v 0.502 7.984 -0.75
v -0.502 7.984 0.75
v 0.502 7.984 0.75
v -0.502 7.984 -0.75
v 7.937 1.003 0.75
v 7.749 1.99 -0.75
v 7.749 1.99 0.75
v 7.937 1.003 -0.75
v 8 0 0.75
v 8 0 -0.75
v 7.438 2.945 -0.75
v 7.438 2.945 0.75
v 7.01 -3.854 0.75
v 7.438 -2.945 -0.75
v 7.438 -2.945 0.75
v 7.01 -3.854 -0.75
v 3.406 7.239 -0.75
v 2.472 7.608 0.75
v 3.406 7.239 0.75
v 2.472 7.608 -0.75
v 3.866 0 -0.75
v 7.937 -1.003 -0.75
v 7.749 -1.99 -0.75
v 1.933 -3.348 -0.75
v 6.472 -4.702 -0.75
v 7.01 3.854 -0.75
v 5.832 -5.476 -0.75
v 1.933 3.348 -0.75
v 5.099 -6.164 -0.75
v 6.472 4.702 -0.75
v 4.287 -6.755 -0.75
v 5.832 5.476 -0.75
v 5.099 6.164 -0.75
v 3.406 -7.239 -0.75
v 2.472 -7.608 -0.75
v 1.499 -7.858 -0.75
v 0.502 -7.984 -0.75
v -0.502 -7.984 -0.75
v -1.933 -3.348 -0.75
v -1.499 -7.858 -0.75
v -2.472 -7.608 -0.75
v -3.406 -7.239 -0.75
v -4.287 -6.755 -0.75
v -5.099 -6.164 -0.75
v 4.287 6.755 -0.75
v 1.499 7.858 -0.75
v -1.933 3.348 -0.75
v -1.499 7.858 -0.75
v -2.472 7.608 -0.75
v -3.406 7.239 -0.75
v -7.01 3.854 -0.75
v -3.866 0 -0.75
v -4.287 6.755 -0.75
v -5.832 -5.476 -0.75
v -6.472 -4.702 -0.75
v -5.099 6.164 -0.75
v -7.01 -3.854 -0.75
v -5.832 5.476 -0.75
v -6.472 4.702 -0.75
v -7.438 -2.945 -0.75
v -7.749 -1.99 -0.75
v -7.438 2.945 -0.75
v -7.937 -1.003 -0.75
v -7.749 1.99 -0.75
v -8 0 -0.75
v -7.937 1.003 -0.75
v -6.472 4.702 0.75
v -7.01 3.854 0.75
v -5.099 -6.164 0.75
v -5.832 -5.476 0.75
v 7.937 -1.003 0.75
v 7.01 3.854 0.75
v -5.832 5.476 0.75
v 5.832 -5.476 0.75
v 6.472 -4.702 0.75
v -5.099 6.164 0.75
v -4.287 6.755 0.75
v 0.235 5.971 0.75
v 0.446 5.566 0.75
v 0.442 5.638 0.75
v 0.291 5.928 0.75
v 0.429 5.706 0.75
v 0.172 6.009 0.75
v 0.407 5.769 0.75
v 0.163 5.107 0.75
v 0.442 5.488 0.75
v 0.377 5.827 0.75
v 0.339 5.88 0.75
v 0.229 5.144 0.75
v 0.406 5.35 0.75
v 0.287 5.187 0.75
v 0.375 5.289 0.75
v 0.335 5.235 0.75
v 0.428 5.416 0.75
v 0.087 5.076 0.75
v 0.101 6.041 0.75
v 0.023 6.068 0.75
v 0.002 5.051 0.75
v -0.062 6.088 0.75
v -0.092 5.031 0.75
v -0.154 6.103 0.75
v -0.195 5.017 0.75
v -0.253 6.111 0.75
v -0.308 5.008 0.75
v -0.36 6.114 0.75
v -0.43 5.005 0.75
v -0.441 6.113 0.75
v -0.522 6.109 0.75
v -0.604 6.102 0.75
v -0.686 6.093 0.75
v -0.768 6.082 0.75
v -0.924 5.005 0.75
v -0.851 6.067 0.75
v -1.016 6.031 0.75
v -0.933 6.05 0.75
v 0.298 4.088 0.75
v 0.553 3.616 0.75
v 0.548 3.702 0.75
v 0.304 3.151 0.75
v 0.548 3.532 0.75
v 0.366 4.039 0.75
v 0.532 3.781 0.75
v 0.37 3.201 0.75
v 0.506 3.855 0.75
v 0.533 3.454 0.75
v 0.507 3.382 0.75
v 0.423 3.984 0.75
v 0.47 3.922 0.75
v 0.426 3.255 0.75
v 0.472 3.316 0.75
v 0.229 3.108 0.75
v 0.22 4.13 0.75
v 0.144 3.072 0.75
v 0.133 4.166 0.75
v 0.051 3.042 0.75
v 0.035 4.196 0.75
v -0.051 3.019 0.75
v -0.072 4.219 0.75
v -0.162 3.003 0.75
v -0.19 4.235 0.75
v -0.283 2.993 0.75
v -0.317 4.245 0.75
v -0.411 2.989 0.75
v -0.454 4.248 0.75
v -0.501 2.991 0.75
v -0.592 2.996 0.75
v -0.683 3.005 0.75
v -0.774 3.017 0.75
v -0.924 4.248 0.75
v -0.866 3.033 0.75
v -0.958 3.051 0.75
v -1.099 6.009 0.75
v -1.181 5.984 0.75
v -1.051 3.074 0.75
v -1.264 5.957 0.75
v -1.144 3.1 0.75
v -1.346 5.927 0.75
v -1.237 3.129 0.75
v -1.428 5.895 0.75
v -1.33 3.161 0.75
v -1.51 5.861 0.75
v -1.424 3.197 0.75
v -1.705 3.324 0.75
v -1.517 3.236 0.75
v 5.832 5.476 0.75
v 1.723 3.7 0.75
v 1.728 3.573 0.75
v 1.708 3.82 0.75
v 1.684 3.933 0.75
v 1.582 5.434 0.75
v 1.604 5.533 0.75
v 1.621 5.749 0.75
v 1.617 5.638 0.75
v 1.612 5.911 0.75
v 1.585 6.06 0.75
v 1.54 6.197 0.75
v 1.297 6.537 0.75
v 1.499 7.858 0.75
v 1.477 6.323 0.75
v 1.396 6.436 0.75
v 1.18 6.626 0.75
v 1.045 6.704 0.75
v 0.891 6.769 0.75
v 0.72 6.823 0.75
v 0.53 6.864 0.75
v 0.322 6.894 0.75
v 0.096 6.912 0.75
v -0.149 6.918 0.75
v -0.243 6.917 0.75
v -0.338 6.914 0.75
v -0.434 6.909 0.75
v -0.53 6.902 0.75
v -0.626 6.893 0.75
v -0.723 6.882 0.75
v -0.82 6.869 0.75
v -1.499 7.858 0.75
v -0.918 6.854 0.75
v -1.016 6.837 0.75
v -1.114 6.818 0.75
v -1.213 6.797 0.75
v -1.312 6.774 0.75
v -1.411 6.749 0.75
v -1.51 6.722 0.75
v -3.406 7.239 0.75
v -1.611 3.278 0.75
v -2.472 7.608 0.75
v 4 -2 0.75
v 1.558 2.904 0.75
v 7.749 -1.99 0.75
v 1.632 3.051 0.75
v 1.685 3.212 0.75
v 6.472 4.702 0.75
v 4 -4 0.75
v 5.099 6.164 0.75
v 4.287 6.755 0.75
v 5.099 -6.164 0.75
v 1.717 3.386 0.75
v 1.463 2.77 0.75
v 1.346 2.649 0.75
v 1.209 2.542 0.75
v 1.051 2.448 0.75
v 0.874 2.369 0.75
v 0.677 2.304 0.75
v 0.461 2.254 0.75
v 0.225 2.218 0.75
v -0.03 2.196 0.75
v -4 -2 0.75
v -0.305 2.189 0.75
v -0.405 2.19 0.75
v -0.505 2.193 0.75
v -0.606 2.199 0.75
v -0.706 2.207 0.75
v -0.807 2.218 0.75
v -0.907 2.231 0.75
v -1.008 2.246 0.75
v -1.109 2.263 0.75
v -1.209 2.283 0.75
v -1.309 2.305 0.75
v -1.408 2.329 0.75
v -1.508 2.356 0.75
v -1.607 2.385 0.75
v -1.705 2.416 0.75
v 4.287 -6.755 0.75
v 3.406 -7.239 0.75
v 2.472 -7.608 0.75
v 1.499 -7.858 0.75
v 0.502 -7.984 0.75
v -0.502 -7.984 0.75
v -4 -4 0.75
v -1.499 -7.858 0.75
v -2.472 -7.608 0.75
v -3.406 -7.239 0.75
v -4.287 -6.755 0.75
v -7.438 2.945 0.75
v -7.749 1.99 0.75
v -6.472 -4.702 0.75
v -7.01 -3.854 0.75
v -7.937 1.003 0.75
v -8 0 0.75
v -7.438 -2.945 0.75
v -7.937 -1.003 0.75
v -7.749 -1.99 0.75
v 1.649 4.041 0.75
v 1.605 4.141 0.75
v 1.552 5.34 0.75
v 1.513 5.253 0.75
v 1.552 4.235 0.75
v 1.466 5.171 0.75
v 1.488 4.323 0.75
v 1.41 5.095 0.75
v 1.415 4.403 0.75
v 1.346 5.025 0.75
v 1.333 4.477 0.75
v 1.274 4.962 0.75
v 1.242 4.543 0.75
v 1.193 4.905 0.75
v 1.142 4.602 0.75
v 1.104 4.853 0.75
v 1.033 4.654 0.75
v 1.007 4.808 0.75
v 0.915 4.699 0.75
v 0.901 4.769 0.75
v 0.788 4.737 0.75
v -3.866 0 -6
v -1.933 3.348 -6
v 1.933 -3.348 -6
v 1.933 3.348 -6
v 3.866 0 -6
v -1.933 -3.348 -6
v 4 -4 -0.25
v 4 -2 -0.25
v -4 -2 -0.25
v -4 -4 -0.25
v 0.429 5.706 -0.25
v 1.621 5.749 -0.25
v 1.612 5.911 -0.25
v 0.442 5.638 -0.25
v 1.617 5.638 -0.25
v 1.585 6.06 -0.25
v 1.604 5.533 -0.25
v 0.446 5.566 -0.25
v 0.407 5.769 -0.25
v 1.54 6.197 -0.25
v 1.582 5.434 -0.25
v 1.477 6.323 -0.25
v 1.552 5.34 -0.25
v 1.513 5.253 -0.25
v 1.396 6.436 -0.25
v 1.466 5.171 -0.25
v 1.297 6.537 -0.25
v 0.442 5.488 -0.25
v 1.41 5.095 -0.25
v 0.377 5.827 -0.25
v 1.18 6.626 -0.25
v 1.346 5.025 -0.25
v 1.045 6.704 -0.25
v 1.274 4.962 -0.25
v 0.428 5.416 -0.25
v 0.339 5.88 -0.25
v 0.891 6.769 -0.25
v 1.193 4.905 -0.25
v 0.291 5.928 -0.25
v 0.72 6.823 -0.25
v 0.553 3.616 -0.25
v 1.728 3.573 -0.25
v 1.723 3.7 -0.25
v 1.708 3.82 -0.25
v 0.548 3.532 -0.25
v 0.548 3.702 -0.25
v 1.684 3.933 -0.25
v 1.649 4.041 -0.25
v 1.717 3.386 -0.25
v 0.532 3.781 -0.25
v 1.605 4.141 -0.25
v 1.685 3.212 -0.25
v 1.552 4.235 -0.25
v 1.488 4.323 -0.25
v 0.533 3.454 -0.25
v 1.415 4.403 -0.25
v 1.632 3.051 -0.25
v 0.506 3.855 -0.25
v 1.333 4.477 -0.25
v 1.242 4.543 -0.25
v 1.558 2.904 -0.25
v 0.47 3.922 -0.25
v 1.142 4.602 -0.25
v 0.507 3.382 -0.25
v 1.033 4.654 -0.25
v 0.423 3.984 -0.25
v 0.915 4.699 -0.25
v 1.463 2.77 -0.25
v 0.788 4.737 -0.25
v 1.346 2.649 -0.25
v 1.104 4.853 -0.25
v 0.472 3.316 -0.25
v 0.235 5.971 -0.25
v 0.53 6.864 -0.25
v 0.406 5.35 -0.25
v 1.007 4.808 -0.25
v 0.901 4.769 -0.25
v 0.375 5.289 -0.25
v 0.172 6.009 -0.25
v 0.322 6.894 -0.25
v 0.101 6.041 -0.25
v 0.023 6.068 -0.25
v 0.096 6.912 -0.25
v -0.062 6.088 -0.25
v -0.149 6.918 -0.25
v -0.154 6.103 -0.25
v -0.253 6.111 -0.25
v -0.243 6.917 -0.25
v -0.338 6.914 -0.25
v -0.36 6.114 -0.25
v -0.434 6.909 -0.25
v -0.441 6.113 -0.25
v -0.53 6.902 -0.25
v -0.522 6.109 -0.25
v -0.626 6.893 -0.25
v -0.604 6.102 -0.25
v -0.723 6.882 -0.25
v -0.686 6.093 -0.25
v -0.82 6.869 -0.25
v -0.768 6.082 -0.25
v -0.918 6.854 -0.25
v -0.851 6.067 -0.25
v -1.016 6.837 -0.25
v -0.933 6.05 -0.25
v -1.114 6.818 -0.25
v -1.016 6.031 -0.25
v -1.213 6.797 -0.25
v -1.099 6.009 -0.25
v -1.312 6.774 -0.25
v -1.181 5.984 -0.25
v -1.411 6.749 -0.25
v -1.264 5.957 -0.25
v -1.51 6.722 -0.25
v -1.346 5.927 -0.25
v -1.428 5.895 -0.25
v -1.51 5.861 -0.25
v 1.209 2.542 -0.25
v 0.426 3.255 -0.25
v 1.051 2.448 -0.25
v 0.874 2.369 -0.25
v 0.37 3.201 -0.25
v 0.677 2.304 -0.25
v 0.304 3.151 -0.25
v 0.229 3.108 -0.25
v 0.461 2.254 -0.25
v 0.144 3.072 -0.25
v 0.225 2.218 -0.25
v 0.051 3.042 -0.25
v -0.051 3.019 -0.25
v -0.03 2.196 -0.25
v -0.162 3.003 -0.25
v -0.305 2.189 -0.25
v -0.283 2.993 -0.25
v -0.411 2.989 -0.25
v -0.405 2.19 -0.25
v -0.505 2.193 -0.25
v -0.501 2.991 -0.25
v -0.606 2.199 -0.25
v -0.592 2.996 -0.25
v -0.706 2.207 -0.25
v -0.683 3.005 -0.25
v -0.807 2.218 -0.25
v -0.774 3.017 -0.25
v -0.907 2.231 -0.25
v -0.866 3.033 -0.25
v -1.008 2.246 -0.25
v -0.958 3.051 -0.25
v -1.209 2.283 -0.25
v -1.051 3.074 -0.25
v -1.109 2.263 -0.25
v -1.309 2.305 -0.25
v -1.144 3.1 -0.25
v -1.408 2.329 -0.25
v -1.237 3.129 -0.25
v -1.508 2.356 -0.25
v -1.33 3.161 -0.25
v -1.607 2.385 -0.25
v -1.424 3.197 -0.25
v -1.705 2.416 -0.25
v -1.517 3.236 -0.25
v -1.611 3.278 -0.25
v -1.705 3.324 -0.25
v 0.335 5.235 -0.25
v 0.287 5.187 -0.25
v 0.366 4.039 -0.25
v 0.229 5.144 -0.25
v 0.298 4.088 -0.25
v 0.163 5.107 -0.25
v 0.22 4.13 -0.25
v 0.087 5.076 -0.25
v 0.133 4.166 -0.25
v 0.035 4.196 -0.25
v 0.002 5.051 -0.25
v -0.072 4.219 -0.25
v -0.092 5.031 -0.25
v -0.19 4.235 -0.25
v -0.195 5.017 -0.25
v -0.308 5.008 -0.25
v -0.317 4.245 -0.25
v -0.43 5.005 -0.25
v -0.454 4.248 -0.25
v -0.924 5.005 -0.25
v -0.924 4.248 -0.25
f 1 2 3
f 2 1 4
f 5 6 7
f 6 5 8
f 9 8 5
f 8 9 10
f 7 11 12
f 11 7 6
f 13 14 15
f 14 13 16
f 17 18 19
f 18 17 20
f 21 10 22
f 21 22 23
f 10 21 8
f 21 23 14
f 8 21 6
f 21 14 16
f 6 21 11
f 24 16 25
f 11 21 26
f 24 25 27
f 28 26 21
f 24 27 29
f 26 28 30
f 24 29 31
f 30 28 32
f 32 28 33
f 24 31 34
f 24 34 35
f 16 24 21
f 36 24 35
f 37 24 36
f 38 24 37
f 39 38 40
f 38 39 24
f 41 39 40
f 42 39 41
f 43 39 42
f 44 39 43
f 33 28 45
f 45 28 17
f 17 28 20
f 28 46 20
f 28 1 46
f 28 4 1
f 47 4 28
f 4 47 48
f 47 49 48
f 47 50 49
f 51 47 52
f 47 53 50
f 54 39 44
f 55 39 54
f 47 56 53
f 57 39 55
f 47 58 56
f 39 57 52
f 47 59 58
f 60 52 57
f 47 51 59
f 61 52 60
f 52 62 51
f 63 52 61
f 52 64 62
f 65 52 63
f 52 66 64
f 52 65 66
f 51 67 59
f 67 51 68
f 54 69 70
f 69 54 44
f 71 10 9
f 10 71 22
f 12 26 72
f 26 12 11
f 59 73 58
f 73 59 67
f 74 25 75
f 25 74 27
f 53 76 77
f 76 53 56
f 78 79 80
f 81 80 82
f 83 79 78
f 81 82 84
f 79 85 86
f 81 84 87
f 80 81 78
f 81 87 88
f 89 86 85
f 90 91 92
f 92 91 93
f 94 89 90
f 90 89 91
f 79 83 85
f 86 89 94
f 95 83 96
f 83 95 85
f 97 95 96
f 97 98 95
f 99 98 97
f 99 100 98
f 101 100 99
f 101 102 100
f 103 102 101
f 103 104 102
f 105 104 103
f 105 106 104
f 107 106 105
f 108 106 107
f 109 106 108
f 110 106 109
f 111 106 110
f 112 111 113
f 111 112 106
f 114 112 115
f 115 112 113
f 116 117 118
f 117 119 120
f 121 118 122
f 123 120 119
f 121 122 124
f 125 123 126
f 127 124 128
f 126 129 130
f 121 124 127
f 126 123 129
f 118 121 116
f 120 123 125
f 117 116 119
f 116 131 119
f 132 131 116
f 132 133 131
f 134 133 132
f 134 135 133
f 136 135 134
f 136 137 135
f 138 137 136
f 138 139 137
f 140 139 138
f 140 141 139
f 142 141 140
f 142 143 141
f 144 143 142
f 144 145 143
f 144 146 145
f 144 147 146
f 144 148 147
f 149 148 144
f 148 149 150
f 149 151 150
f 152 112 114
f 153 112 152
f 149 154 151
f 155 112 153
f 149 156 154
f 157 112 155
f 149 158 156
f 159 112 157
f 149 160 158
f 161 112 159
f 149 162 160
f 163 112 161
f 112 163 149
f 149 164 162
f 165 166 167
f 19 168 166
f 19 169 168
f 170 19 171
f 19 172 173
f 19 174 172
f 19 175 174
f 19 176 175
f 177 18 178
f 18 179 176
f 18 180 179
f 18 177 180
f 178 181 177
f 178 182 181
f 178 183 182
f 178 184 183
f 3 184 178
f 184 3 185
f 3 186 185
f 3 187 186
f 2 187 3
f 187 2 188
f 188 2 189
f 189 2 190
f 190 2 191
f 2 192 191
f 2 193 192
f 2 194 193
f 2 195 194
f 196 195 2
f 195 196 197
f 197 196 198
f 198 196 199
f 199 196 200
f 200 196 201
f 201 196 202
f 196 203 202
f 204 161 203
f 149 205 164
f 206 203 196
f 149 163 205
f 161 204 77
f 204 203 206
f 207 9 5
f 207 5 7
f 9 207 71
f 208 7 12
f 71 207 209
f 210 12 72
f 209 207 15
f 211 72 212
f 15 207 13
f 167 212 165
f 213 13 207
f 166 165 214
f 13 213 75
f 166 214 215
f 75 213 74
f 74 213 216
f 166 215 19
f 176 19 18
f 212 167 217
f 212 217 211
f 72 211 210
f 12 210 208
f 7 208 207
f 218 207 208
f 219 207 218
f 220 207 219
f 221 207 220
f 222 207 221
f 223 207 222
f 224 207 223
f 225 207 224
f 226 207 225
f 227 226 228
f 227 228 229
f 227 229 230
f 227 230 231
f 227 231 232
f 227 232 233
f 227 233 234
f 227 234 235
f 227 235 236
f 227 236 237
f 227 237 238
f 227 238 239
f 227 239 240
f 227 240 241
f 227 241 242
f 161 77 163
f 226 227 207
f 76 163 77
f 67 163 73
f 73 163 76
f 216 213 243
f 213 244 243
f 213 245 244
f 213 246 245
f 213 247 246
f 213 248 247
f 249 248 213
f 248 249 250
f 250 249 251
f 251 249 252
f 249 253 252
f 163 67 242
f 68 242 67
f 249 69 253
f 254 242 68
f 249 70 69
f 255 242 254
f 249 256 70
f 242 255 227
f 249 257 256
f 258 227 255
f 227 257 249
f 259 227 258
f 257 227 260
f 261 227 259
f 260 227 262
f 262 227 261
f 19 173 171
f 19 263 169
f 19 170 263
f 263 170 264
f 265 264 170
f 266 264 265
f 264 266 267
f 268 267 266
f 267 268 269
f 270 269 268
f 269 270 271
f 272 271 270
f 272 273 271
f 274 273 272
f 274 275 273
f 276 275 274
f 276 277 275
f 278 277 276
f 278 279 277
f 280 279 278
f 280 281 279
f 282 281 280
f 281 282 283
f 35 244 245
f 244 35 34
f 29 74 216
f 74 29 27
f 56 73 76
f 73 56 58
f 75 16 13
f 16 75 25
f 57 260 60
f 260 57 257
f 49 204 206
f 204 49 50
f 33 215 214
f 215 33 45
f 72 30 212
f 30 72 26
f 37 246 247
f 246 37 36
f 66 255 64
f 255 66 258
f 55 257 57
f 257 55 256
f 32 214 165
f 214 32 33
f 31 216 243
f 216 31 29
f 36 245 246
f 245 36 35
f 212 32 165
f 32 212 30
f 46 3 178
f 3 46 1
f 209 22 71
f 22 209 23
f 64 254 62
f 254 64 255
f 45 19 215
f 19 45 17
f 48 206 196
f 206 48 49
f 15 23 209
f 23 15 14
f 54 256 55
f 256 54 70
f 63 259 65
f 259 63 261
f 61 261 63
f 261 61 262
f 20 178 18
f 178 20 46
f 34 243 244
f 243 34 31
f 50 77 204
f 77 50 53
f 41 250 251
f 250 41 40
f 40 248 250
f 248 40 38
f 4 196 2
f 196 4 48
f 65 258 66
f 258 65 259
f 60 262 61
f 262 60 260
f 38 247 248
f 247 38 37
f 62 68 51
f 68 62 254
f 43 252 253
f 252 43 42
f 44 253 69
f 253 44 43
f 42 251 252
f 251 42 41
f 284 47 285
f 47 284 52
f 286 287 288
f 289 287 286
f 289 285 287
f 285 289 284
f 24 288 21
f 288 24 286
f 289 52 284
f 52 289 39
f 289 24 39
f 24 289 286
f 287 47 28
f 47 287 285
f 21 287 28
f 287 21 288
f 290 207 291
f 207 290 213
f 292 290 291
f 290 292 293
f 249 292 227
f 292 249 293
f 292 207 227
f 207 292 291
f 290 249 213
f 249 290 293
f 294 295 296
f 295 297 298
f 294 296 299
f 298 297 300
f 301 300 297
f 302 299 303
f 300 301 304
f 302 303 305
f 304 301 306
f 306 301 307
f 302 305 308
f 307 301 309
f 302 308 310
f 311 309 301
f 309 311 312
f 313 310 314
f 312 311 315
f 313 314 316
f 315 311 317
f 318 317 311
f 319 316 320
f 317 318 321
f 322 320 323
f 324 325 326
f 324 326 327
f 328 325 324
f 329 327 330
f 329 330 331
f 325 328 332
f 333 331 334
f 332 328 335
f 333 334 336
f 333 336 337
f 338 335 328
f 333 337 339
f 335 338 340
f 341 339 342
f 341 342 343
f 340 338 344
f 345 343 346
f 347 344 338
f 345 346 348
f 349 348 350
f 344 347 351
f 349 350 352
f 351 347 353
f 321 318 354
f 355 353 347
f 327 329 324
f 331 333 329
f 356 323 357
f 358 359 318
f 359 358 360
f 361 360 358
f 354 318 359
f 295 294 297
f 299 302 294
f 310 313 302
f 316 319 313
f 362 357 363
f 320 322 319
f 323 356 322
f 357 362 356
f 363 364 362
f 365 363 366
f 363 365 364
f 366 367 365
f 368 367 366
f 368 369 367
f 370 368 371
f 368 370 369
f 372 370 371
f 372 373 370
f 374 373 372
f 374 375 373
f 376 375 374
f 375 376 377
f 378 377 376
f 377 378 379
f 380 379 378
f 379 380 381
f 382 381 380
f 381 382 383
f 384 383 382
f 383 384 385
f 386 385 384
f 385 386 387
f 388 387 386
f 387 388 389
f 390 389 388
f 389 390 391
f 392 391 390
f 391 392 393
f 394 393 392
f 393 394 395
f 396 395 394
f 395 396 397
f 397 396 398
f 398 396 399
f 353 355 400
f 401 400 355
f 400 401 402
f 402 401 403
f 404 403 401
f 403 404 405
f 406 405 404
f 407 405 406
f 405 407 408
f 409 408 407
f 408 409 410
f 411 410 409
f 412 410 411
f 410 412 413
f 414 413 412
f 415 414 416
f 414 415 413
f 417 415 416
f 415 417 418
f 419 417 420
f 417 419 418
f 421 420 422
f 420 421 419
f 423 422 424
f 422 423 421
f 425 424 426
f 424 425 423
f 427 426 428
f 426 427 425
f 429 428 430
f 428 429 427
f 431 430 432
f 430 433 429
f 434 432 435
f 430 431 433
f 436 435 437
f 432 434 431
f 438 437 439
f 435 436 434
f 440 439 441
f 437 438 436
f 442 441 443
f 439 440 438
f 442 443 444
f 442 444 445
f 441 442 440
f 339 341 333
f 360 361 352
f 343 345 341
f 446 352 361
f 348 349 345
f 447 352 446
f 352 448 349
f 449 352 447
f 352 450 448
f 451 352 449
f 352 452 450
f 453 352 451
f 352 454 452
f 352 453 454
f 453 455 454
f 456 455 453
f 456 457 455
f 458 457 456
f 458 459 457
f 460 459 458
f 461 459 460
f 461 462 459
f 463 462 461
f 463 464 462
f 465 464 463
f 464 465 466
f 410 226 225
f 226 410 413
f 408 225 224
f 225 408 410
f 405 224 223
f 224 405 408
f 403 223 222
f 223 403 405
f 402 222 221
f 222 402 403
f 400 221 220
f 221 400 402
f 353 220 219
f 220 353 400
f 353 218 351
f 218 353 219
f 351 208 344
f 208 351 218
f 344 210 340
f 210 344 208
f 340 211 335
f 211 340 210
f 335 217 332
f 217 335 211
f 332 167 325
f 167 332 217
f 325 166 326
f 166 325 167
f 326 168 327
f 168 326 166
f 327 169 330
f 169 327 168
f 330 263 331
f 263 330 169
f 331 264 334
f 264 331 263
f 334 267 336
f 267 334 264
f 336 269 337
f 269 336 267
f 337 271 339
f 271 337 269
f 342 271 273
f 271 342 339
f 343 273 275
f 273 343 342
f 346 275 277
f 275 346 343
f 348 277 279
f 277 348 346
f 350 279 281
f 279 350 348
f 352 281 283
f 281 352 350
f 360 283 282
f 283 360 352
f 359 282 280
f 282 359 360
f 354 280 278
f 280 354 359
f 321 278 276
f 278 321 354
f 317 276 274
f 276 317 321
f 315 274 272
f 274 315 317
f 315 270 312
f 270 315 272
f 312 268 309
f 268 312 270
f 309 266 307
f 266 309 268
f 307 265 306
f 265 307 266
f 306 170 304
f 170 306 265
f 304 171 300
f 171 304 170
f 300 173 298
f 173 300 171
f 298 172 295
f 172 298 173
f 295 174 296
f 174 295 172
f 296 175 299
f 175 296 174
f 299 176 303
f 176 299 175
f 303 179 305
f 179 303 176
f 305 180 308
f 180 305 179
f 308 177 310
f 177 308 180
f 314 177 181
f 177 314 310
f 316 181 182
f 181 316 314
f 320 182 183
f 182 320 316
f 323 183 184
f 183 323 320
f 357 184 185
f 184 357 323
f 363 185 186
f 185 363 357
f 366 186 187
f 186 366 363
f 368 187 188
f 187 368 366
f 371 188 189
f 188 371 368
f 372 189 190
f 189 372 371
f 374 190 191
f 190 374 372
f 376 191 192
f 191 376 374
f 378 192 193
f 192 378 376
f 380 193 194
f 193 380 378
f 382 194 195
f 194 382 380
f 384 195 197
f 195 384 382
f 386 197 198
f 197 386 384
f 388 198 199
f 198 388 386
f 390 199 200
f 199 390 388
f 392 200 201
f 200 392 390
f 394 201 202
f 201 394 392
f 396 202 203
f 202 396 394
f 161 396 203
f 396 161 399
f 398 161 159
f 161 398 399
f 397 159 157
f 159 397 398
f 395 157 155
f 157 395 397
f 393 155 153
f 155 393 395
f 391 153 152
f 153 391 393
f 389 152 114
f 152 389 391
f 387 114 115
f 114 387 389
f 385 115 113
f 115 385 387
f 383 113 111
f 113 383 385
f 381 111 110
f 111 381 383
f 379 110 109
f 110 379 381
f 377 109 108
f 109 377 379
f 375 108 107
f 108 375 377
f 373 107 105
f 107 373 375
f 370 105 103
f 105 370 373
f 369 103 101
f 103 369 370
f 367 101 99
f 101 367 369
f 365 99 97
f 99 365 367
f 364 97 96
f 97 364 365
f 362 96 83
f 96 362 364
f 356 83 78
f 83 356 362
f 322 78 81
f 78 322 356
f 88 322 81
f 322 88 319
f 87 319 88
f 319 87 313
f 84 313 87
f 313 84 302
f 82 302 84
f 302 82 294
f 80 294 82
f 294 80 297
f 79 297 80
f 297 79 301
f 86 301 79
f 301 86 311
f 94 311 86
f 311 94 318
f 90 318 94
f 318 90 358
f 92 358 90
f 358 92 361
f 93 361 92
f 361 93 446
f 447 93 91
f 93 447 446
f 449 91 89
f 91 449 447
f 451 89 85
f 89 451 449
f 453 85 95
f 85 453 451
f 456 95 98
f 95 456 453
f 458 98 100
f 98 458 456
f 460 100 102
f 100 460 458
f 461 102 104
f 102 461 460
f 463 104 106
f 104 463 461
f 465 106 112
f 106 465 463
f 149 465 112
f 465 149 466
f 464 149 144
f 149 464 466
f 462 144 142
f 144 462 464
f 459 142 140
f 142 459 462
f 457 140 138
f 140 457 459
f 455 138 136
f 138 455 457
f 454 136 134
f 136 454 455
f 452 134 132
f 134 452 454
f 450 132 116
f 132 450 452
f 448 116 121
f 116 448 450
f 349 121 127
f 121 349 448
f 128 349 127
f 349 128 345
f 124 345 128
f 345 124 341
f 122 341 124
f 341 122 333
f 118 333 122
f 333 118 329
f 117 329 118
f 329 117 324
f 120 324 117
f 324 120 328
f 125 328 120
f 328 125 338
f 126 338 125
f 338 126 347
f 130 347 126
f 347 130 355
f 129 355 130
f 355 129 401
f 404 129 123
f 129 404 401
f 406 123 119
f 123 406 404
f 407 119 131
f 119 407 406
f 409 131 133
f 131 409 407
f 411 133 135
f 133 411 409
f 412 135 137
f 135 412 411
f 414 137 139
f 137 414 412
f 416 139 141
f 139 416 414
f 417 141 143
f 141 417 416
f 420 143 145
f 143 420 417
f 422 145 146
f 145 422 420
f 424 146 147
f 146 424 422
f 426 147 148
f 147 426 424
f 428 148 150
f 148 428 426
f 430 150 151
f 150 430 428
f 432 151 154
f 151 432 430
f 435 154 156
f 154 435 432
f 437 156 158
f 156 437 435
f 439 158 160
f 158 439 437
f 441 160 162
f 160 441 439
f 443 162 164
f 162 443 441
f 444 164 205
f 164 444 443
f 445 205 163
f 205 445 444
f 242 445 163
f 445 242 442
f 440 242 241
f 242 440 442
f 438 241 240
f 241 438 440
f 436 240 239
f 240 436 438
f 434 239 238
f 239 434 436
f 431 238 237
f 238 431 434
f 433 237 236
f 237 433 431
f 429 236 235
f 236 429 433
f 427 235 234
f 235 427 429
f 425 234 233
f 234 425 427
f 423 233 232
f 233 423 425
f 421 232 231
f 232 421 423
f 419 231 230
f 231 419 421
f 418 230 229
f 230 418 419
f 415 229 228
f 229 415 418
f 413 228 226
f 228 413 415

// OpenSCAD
$fn = 50;


difference() {
	union() {
		translate(v = [0, 0, -0.7500000000]) {
			cylinder(h = 1.5000000000, r = 8.0000000000);
		}
		translate(v = [0, 0, -6]) {
			linear_extrude(height = 6) {
				polygon(points = [[3.8658550000, 0.0000000000], [1.9329275000, 3.3479286373], [-1.9329275000, 3.3479286373], [-3.8658550000, 0.0000000000], [-1.9329275000, -3.3479286373], [1.9329275000, -3.3479286373]]);
			}
		}
	}
	union() {
		#translate(v = [-4.0000000000, -4.0000000000, -0.2500000000]) {
			cube(size = [8, 2, 1]);
		}
		#translate(v = [0, 4.5000000000, -0.2500000000]) {
			linear_extrude(height = 1) {
				text(font = "SegoiUI:Bold", halign = "center", size = 4.5000000000, text = "3", valign = "center");
			}
		}
	}
}
